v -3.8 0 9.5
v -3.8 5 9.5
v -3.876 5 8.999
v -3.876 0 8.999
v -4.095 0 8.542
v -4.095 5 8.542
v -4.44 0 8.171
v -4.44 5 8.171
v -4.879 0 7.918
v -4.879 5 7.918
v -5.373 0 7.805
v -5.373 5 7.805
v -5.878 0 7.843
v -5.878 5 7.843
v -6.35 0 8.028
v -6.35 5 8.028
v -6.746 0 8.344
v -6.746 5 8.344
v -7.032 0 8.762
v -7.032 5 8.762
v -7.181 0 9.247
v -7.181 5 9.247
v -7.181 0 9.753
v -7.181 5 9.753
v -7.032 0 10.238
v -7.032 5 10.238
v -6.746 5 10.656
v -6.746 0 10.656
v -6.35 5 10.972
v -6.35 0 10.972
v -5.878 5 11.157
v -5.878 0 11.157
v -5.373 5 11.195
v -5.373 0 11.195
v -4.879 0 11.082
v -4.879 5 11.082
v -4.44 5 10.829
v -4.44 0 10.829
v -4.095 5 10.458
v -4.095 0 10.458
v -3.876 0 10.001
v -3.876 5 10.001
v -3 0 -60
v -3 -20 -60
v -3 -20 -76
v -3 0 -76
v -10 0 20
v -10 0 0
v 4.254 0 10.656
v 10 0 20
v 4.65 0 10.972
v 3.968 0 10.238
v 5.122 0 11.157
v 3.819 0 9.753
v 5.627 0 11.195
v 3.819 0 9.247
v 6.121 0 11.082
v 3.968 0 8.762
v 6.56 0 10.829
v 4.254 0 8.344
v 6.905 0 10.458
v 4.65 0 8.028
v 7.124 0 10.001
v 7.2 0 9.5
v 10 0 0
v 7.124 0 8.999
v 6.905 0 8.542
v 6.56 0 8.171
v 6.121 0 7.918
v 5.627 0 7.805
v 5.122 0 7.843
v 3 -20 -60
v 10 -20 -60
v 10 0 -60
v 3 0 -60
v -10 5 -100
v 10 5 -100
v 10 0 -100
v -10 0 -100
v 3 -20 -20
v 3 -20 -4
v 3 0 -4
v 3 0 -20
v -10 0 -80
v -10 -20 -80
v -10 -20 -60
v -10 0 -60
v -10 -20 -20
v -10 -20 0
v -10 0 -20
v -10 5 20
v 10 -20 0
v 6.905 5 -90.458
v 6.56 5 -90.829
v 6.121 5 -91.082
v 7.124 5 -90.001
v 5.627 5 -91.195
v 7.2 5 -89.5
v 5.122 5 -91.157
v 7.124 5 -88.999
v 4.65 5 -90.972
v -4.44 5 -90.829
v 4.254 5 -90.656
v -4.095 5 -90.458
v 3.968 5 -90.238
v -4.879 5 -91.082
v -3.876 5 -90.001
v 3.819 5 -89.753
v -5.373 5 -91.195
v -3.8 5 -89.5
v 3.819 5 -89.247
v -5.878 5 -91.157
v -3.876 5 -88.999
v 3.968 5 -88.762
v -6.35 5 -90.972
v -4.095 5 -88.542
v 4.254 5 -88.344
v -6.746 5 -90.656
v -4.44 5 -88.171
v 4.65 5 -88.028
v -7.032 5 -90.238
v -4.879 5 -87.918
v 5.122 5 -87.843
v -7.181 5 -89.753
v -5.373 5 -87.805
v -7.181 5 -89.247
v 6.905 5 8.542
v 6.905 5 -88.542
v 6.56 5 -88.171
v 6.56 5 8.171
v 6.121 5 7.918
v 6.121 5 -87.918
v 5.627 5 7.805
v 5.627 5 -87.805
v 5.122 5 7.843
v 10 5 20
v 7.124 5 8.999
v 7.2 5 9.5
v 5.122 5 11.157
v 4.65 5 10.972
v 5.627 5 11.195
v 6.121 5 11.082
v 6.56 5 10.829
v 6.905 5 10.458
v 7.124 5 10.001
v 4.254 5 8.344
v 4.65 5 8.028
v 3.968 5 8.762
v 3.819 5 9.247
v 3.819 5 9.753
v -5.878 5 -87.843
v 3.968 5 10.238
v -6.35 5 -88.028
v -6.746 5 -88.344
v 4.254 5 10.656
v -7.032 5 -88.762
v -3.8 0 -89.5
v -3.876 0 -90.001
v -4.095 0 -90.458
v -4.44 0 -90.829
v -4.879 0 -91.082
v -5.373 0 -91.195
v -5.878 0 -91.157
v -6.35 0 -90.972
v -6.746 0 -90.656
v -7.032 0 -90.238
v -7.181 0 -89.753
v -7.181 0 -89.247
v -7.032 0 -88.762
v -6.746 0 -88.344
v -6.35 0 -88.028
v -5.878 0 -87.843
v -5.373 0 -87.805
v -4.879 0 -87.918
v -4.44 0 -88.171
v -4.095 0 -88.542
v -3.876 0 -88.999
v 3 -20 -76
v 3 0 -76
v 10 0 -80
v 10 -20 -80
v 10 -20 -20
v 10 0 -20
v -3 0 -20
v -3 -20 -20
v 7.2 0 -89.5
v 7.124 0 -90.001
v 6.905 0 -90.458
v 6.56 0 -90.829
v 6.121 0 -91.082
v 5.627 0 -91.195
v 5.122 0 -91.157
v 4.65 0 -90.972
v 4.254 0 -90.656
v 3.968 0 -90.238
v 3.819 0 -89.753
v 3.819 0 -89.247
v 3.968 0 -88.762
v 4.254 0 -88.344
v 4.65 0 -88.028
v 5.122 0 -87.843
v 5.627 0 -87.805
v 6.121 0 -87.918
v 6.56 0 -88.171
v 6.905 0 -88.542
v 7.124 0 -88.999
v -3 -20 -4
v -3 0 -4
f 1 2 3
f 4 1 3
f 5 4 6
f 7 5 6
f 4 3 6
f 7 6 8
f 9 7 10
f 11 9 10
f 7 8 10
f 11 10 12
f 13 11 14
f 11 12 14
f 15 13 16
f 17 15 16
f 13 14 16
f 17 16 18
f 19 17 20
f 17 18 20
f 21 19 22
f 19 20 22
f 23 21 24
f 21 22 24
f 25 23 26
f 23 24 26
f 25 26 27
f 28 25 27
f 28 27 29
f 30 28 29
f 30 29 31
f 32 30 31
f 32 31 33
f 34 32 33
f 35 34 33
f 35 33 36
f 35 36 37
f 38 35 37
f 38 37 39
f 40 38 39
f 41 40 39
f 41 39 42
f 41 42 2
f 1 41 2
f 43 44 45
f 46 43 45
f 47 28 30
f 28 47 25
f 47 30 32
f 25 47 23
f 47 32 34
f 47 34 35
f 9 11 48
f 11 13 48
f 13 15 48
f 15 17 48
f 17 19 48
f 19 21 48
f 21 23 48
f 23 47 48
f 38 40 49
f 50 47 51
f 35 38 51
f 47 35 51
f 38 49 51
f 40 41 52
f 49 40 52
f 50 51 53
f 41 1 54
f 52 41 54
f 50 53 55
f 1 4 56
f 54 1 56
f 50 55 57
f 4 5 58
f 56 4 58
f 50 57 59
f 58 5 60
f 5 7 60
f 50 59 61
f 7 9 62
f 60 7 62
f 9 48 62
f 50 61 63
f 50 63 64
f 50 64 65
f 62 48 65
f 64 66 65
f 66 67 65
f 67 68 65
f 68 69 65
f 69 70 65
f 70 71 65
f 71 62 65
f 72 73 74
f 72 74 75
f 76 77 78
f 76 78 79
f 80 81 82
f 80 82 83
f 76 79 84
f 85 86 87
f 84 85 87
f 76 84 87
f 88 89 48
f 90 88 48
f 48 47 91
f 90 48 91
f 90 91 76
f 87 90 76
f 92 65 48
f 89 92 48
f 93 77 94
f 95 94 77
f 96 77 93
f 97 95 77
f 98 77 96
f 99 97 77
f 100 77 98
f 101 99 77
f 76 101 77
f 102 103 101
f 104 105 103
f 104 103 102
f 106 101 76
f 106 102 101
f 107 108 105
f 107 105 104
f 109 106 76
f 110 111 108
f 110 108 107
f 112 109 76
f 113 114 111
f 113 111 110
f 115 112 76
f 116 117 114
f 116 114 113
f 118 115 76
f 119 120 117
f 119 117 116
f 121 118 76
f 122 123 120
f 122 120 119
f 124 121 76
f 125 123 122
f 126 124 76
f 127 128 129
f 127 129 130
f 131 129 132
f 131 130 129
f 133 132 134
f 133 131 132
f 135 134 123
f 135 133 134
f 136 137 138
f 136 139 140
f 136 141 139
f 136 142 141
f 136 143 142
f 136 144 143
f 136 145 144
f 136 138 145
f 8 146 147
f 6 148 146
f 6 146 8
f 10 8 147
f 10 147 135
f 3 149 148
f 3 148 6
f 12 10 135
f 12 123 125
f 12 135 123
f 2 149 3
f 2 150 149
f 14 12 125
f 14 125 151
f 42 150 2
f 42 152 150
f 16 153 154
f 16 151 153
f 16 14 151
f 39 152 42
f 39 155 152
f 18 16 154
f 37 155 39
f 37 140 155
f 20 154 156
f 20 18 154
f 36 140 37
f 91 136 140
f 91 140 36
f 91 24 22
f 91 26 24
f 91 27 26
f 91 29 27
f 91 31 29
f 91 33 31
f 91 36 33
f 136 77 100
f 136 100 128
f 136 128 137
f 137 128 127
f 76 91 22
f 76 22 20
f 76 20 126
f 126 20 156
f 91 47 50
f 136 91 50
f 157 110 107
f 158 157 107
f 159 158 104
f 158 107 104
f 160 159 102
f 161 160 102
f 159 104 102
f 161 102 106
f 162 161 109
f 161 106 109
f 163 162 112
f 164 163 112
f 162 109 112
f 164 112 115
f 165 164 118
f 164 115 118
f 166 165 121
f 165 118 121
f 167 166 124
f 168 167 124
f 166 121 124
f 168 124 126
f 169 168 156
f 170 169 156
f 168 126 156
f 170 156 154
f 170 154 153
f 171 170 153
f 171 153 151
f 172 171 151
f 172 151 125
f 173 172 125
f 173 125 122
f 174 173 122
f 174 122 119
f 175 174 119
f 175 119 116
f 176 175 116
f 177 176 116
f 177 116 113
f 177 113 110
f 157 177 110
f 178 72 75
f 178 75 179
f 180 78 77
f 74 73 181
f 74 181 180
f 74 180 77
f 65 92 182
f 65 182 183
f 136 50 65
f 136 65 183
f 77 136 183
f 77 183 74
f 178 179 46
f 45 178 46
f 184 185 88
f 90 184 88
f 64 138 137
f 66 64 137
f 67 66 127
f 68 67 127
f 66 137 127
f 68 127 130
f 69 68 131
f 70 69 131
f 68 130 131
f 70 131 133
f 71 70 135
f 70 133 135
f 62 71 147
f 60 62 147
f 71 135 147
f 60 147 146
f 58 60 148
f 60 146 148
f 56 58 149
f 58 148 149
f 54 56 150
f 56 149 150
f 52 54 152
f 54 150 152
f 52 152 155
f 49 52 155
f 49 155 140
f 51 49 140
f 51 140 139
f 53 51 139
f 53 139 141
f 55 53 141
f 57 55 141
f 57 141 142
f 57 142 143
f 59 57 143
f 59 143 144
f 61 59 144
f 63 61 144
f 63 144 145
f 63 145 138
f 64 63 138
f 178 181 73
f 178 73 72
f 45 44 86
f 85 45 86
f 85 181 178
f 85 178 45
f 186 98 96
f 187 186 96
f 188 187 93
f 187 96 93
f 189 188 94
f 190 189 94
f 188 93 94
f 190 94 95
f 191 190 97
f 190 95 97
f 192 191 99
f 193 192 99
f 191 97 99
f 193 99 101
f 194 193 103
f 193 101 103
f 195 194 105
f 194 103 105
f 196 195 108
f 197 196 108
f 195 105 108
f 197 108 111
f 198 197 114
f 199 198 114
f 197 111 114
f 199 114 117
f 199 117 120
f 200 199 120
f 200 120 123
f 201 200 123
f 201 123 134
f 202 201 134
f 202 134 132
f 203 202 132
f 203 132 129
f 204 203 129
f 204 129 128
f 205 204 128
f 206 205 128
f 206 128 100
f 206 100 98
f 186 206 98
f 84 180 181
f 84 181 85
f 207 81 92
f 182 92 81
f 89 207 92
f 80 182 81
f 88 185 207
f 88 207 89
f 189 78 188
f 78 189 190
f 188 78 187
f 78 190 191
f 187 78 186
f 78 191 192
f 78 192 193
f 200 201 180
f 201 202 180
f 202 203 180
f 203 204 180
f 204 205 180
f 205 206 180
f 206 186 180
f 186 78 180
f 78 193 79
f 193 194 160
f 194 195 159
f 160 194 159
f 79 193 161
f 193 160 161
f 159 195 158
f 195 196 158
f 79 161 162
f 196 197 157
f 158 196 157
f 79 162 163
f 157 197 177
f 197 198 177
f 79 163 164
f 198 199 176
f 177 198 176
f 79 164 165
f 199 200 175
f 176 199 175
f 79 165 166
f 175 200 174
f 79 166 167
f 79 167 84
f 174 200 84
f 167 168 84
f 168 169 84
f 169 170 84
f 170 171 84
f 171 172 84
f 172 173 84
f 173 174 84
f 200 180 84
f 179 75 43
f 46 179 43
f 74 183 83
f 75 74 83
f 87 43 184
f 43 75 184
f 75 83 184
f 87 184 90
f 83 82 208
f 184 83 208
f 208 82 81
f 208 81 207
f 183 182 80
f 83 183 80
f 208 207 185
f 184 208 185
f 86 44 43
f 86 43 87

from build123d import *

# Parameters (mm, degrees)
SKETCH1_W            = 20
SKETCH1_H            = 40
BOSS_EXTRUDE1_DEPTH  = 5
SKETCH2_W            = 20
SKETCH2_H            = 20
BOSS_EXTRUDE2_DEPTH  = 20
SKETCH3_W            = 6
SKETCH3_H            = 16
CUT_EXTRUDE1_DEPTH   = 20
M3_CLEARANCE_HOLE1_D = 3.4
SKETCH6_W            = 20
SKETCH6_H            = 5
BOSS_EXTRUDE3_DEPTH  = 60
SKETCH7_W            = 20
SKETCH7_H            = 5
BOSS_EXTRUDE4_DEPTH  = 20
SKETCH8_W            = 20
SKETCH8_H            = 20
BOSS_EXTRUDE5_DEPTH  = 20
SKETCH9_W            = 6
SKETCH9_H            = 16
CUT_EXTRUDE2_DEPTH   = 20
M3_CLEARANCE_HOLE2_D = 3.4


with BuildPart() as part:
    # Sketch1 → Boss-Extrude1 (new body)
    with BuildSketch(Plane(origin=(0, 0, 0), x_dir=(1, 0, 0), z_dir=(0, 1, 0))):
        Rectangle(SKETCH1_W, SKETCH1_H)
    extrude(amount=BOSS_EXTRUDE1_DEPTH)

    # Sketch2 → Boss-Extrude2 (add)
    with BuildSketch(Plane(origin=(0, 0, 0), x_dir=(-1, 0, 0), z_dir=(0, -1, 0))):
        with Locations((0, 10)):
            Rectangle(SKETCH2_W, SKETCH2_H)
    extrude(amount=BOSS_EXTRUDE2_DEPTH)

    # Sketch3 → Cut-Extrude1 (cut)
    with BuildSketch(Plane(origin=(0, -20, 0), x_dir=(-1, 0, 0), z_dir=(0, -1, 0))):
        with Locations((0, 12)):
            Rectangle(SKETCH3_W, SKETCH3_H)
    extrude(amount=-CUT_EXTRUDE1_DEPTH, mode=Mode.SUBTRACT)

    # M3 Clearance Hole1 (through all)
    with Locations(Plane(origin=(0, 0, 0), x_dir=(-1, 0, 0), z_dir=(0, -1, 0))):
        with Locations((-5.5, -9.5), (5.5, -9.5)):
            Hole(M3_CLEARANCE_HOLE1_D / 2)

    # Sketch6 → Boss-Extrude3 (add)
    with BuildSketch(Plane(origin=(0, 0, -20), x_dir=(-1, 0, 0), z_dir=(0, 0, -1))):
        with Locations((0, 2.5)):
            Rectangle(SKETCH6_W, SKETCH6_H)
    extrude(amount=BOSS_EXTRUDE3_DEPTH)

    # Sketch7 → Boss-Extrude4 (add)
    with BuildSketch(Plane(origin=(0, 0, -80), x_dir=(-1, 0, 0), z_dir=(0, 0, -1))):
        with Locations((0, 2.5)):
            Rectangle(SKETCH7_W, SKETCH7_H)
    extrude(amount=BOSS_EXTRUDE4_DEPTH)

    # Sketch8 → Boss-Extrude5 (add)
    with BuildSketch(Plane(origin=(0, 0, 0), x_dir=(-1, 0, 0), z_dir=(0, -1, 0))):
        with Locations((0, 70)):
            Rectangle(SKETCH8_W, SKETCH8_H)
    extrude(amount=BOSS_EXTRUDE5_DEPTH)

    # Sketch9 → Cut-Extrude2 (cut)
    with BuildSketch(Plane(origin=(0, -20, 0), x_dir=(-1, 0, 0), z_dir=(0, -1, 0))):
        with Locations((0, 68)):
            Rectangle(SKETCH9_W, SKETCH9_H)
    extrude(amount=-CUT_EXTRUDE2_DEPTH, mode=Mode.SUBTRACT)

    # M3 Clearance Hole2 (through all)
    with Locations(Plane(origin=(0, 0, 0), x_dir=(-1, 0, 0), z_dir=(0, -1, 0))):
        with Locations((-5.5, 89.5), (5.5, 89.5)):
            Hole(M3_CLEARANCE_HOLE2_D / 2)


solid = part.part
